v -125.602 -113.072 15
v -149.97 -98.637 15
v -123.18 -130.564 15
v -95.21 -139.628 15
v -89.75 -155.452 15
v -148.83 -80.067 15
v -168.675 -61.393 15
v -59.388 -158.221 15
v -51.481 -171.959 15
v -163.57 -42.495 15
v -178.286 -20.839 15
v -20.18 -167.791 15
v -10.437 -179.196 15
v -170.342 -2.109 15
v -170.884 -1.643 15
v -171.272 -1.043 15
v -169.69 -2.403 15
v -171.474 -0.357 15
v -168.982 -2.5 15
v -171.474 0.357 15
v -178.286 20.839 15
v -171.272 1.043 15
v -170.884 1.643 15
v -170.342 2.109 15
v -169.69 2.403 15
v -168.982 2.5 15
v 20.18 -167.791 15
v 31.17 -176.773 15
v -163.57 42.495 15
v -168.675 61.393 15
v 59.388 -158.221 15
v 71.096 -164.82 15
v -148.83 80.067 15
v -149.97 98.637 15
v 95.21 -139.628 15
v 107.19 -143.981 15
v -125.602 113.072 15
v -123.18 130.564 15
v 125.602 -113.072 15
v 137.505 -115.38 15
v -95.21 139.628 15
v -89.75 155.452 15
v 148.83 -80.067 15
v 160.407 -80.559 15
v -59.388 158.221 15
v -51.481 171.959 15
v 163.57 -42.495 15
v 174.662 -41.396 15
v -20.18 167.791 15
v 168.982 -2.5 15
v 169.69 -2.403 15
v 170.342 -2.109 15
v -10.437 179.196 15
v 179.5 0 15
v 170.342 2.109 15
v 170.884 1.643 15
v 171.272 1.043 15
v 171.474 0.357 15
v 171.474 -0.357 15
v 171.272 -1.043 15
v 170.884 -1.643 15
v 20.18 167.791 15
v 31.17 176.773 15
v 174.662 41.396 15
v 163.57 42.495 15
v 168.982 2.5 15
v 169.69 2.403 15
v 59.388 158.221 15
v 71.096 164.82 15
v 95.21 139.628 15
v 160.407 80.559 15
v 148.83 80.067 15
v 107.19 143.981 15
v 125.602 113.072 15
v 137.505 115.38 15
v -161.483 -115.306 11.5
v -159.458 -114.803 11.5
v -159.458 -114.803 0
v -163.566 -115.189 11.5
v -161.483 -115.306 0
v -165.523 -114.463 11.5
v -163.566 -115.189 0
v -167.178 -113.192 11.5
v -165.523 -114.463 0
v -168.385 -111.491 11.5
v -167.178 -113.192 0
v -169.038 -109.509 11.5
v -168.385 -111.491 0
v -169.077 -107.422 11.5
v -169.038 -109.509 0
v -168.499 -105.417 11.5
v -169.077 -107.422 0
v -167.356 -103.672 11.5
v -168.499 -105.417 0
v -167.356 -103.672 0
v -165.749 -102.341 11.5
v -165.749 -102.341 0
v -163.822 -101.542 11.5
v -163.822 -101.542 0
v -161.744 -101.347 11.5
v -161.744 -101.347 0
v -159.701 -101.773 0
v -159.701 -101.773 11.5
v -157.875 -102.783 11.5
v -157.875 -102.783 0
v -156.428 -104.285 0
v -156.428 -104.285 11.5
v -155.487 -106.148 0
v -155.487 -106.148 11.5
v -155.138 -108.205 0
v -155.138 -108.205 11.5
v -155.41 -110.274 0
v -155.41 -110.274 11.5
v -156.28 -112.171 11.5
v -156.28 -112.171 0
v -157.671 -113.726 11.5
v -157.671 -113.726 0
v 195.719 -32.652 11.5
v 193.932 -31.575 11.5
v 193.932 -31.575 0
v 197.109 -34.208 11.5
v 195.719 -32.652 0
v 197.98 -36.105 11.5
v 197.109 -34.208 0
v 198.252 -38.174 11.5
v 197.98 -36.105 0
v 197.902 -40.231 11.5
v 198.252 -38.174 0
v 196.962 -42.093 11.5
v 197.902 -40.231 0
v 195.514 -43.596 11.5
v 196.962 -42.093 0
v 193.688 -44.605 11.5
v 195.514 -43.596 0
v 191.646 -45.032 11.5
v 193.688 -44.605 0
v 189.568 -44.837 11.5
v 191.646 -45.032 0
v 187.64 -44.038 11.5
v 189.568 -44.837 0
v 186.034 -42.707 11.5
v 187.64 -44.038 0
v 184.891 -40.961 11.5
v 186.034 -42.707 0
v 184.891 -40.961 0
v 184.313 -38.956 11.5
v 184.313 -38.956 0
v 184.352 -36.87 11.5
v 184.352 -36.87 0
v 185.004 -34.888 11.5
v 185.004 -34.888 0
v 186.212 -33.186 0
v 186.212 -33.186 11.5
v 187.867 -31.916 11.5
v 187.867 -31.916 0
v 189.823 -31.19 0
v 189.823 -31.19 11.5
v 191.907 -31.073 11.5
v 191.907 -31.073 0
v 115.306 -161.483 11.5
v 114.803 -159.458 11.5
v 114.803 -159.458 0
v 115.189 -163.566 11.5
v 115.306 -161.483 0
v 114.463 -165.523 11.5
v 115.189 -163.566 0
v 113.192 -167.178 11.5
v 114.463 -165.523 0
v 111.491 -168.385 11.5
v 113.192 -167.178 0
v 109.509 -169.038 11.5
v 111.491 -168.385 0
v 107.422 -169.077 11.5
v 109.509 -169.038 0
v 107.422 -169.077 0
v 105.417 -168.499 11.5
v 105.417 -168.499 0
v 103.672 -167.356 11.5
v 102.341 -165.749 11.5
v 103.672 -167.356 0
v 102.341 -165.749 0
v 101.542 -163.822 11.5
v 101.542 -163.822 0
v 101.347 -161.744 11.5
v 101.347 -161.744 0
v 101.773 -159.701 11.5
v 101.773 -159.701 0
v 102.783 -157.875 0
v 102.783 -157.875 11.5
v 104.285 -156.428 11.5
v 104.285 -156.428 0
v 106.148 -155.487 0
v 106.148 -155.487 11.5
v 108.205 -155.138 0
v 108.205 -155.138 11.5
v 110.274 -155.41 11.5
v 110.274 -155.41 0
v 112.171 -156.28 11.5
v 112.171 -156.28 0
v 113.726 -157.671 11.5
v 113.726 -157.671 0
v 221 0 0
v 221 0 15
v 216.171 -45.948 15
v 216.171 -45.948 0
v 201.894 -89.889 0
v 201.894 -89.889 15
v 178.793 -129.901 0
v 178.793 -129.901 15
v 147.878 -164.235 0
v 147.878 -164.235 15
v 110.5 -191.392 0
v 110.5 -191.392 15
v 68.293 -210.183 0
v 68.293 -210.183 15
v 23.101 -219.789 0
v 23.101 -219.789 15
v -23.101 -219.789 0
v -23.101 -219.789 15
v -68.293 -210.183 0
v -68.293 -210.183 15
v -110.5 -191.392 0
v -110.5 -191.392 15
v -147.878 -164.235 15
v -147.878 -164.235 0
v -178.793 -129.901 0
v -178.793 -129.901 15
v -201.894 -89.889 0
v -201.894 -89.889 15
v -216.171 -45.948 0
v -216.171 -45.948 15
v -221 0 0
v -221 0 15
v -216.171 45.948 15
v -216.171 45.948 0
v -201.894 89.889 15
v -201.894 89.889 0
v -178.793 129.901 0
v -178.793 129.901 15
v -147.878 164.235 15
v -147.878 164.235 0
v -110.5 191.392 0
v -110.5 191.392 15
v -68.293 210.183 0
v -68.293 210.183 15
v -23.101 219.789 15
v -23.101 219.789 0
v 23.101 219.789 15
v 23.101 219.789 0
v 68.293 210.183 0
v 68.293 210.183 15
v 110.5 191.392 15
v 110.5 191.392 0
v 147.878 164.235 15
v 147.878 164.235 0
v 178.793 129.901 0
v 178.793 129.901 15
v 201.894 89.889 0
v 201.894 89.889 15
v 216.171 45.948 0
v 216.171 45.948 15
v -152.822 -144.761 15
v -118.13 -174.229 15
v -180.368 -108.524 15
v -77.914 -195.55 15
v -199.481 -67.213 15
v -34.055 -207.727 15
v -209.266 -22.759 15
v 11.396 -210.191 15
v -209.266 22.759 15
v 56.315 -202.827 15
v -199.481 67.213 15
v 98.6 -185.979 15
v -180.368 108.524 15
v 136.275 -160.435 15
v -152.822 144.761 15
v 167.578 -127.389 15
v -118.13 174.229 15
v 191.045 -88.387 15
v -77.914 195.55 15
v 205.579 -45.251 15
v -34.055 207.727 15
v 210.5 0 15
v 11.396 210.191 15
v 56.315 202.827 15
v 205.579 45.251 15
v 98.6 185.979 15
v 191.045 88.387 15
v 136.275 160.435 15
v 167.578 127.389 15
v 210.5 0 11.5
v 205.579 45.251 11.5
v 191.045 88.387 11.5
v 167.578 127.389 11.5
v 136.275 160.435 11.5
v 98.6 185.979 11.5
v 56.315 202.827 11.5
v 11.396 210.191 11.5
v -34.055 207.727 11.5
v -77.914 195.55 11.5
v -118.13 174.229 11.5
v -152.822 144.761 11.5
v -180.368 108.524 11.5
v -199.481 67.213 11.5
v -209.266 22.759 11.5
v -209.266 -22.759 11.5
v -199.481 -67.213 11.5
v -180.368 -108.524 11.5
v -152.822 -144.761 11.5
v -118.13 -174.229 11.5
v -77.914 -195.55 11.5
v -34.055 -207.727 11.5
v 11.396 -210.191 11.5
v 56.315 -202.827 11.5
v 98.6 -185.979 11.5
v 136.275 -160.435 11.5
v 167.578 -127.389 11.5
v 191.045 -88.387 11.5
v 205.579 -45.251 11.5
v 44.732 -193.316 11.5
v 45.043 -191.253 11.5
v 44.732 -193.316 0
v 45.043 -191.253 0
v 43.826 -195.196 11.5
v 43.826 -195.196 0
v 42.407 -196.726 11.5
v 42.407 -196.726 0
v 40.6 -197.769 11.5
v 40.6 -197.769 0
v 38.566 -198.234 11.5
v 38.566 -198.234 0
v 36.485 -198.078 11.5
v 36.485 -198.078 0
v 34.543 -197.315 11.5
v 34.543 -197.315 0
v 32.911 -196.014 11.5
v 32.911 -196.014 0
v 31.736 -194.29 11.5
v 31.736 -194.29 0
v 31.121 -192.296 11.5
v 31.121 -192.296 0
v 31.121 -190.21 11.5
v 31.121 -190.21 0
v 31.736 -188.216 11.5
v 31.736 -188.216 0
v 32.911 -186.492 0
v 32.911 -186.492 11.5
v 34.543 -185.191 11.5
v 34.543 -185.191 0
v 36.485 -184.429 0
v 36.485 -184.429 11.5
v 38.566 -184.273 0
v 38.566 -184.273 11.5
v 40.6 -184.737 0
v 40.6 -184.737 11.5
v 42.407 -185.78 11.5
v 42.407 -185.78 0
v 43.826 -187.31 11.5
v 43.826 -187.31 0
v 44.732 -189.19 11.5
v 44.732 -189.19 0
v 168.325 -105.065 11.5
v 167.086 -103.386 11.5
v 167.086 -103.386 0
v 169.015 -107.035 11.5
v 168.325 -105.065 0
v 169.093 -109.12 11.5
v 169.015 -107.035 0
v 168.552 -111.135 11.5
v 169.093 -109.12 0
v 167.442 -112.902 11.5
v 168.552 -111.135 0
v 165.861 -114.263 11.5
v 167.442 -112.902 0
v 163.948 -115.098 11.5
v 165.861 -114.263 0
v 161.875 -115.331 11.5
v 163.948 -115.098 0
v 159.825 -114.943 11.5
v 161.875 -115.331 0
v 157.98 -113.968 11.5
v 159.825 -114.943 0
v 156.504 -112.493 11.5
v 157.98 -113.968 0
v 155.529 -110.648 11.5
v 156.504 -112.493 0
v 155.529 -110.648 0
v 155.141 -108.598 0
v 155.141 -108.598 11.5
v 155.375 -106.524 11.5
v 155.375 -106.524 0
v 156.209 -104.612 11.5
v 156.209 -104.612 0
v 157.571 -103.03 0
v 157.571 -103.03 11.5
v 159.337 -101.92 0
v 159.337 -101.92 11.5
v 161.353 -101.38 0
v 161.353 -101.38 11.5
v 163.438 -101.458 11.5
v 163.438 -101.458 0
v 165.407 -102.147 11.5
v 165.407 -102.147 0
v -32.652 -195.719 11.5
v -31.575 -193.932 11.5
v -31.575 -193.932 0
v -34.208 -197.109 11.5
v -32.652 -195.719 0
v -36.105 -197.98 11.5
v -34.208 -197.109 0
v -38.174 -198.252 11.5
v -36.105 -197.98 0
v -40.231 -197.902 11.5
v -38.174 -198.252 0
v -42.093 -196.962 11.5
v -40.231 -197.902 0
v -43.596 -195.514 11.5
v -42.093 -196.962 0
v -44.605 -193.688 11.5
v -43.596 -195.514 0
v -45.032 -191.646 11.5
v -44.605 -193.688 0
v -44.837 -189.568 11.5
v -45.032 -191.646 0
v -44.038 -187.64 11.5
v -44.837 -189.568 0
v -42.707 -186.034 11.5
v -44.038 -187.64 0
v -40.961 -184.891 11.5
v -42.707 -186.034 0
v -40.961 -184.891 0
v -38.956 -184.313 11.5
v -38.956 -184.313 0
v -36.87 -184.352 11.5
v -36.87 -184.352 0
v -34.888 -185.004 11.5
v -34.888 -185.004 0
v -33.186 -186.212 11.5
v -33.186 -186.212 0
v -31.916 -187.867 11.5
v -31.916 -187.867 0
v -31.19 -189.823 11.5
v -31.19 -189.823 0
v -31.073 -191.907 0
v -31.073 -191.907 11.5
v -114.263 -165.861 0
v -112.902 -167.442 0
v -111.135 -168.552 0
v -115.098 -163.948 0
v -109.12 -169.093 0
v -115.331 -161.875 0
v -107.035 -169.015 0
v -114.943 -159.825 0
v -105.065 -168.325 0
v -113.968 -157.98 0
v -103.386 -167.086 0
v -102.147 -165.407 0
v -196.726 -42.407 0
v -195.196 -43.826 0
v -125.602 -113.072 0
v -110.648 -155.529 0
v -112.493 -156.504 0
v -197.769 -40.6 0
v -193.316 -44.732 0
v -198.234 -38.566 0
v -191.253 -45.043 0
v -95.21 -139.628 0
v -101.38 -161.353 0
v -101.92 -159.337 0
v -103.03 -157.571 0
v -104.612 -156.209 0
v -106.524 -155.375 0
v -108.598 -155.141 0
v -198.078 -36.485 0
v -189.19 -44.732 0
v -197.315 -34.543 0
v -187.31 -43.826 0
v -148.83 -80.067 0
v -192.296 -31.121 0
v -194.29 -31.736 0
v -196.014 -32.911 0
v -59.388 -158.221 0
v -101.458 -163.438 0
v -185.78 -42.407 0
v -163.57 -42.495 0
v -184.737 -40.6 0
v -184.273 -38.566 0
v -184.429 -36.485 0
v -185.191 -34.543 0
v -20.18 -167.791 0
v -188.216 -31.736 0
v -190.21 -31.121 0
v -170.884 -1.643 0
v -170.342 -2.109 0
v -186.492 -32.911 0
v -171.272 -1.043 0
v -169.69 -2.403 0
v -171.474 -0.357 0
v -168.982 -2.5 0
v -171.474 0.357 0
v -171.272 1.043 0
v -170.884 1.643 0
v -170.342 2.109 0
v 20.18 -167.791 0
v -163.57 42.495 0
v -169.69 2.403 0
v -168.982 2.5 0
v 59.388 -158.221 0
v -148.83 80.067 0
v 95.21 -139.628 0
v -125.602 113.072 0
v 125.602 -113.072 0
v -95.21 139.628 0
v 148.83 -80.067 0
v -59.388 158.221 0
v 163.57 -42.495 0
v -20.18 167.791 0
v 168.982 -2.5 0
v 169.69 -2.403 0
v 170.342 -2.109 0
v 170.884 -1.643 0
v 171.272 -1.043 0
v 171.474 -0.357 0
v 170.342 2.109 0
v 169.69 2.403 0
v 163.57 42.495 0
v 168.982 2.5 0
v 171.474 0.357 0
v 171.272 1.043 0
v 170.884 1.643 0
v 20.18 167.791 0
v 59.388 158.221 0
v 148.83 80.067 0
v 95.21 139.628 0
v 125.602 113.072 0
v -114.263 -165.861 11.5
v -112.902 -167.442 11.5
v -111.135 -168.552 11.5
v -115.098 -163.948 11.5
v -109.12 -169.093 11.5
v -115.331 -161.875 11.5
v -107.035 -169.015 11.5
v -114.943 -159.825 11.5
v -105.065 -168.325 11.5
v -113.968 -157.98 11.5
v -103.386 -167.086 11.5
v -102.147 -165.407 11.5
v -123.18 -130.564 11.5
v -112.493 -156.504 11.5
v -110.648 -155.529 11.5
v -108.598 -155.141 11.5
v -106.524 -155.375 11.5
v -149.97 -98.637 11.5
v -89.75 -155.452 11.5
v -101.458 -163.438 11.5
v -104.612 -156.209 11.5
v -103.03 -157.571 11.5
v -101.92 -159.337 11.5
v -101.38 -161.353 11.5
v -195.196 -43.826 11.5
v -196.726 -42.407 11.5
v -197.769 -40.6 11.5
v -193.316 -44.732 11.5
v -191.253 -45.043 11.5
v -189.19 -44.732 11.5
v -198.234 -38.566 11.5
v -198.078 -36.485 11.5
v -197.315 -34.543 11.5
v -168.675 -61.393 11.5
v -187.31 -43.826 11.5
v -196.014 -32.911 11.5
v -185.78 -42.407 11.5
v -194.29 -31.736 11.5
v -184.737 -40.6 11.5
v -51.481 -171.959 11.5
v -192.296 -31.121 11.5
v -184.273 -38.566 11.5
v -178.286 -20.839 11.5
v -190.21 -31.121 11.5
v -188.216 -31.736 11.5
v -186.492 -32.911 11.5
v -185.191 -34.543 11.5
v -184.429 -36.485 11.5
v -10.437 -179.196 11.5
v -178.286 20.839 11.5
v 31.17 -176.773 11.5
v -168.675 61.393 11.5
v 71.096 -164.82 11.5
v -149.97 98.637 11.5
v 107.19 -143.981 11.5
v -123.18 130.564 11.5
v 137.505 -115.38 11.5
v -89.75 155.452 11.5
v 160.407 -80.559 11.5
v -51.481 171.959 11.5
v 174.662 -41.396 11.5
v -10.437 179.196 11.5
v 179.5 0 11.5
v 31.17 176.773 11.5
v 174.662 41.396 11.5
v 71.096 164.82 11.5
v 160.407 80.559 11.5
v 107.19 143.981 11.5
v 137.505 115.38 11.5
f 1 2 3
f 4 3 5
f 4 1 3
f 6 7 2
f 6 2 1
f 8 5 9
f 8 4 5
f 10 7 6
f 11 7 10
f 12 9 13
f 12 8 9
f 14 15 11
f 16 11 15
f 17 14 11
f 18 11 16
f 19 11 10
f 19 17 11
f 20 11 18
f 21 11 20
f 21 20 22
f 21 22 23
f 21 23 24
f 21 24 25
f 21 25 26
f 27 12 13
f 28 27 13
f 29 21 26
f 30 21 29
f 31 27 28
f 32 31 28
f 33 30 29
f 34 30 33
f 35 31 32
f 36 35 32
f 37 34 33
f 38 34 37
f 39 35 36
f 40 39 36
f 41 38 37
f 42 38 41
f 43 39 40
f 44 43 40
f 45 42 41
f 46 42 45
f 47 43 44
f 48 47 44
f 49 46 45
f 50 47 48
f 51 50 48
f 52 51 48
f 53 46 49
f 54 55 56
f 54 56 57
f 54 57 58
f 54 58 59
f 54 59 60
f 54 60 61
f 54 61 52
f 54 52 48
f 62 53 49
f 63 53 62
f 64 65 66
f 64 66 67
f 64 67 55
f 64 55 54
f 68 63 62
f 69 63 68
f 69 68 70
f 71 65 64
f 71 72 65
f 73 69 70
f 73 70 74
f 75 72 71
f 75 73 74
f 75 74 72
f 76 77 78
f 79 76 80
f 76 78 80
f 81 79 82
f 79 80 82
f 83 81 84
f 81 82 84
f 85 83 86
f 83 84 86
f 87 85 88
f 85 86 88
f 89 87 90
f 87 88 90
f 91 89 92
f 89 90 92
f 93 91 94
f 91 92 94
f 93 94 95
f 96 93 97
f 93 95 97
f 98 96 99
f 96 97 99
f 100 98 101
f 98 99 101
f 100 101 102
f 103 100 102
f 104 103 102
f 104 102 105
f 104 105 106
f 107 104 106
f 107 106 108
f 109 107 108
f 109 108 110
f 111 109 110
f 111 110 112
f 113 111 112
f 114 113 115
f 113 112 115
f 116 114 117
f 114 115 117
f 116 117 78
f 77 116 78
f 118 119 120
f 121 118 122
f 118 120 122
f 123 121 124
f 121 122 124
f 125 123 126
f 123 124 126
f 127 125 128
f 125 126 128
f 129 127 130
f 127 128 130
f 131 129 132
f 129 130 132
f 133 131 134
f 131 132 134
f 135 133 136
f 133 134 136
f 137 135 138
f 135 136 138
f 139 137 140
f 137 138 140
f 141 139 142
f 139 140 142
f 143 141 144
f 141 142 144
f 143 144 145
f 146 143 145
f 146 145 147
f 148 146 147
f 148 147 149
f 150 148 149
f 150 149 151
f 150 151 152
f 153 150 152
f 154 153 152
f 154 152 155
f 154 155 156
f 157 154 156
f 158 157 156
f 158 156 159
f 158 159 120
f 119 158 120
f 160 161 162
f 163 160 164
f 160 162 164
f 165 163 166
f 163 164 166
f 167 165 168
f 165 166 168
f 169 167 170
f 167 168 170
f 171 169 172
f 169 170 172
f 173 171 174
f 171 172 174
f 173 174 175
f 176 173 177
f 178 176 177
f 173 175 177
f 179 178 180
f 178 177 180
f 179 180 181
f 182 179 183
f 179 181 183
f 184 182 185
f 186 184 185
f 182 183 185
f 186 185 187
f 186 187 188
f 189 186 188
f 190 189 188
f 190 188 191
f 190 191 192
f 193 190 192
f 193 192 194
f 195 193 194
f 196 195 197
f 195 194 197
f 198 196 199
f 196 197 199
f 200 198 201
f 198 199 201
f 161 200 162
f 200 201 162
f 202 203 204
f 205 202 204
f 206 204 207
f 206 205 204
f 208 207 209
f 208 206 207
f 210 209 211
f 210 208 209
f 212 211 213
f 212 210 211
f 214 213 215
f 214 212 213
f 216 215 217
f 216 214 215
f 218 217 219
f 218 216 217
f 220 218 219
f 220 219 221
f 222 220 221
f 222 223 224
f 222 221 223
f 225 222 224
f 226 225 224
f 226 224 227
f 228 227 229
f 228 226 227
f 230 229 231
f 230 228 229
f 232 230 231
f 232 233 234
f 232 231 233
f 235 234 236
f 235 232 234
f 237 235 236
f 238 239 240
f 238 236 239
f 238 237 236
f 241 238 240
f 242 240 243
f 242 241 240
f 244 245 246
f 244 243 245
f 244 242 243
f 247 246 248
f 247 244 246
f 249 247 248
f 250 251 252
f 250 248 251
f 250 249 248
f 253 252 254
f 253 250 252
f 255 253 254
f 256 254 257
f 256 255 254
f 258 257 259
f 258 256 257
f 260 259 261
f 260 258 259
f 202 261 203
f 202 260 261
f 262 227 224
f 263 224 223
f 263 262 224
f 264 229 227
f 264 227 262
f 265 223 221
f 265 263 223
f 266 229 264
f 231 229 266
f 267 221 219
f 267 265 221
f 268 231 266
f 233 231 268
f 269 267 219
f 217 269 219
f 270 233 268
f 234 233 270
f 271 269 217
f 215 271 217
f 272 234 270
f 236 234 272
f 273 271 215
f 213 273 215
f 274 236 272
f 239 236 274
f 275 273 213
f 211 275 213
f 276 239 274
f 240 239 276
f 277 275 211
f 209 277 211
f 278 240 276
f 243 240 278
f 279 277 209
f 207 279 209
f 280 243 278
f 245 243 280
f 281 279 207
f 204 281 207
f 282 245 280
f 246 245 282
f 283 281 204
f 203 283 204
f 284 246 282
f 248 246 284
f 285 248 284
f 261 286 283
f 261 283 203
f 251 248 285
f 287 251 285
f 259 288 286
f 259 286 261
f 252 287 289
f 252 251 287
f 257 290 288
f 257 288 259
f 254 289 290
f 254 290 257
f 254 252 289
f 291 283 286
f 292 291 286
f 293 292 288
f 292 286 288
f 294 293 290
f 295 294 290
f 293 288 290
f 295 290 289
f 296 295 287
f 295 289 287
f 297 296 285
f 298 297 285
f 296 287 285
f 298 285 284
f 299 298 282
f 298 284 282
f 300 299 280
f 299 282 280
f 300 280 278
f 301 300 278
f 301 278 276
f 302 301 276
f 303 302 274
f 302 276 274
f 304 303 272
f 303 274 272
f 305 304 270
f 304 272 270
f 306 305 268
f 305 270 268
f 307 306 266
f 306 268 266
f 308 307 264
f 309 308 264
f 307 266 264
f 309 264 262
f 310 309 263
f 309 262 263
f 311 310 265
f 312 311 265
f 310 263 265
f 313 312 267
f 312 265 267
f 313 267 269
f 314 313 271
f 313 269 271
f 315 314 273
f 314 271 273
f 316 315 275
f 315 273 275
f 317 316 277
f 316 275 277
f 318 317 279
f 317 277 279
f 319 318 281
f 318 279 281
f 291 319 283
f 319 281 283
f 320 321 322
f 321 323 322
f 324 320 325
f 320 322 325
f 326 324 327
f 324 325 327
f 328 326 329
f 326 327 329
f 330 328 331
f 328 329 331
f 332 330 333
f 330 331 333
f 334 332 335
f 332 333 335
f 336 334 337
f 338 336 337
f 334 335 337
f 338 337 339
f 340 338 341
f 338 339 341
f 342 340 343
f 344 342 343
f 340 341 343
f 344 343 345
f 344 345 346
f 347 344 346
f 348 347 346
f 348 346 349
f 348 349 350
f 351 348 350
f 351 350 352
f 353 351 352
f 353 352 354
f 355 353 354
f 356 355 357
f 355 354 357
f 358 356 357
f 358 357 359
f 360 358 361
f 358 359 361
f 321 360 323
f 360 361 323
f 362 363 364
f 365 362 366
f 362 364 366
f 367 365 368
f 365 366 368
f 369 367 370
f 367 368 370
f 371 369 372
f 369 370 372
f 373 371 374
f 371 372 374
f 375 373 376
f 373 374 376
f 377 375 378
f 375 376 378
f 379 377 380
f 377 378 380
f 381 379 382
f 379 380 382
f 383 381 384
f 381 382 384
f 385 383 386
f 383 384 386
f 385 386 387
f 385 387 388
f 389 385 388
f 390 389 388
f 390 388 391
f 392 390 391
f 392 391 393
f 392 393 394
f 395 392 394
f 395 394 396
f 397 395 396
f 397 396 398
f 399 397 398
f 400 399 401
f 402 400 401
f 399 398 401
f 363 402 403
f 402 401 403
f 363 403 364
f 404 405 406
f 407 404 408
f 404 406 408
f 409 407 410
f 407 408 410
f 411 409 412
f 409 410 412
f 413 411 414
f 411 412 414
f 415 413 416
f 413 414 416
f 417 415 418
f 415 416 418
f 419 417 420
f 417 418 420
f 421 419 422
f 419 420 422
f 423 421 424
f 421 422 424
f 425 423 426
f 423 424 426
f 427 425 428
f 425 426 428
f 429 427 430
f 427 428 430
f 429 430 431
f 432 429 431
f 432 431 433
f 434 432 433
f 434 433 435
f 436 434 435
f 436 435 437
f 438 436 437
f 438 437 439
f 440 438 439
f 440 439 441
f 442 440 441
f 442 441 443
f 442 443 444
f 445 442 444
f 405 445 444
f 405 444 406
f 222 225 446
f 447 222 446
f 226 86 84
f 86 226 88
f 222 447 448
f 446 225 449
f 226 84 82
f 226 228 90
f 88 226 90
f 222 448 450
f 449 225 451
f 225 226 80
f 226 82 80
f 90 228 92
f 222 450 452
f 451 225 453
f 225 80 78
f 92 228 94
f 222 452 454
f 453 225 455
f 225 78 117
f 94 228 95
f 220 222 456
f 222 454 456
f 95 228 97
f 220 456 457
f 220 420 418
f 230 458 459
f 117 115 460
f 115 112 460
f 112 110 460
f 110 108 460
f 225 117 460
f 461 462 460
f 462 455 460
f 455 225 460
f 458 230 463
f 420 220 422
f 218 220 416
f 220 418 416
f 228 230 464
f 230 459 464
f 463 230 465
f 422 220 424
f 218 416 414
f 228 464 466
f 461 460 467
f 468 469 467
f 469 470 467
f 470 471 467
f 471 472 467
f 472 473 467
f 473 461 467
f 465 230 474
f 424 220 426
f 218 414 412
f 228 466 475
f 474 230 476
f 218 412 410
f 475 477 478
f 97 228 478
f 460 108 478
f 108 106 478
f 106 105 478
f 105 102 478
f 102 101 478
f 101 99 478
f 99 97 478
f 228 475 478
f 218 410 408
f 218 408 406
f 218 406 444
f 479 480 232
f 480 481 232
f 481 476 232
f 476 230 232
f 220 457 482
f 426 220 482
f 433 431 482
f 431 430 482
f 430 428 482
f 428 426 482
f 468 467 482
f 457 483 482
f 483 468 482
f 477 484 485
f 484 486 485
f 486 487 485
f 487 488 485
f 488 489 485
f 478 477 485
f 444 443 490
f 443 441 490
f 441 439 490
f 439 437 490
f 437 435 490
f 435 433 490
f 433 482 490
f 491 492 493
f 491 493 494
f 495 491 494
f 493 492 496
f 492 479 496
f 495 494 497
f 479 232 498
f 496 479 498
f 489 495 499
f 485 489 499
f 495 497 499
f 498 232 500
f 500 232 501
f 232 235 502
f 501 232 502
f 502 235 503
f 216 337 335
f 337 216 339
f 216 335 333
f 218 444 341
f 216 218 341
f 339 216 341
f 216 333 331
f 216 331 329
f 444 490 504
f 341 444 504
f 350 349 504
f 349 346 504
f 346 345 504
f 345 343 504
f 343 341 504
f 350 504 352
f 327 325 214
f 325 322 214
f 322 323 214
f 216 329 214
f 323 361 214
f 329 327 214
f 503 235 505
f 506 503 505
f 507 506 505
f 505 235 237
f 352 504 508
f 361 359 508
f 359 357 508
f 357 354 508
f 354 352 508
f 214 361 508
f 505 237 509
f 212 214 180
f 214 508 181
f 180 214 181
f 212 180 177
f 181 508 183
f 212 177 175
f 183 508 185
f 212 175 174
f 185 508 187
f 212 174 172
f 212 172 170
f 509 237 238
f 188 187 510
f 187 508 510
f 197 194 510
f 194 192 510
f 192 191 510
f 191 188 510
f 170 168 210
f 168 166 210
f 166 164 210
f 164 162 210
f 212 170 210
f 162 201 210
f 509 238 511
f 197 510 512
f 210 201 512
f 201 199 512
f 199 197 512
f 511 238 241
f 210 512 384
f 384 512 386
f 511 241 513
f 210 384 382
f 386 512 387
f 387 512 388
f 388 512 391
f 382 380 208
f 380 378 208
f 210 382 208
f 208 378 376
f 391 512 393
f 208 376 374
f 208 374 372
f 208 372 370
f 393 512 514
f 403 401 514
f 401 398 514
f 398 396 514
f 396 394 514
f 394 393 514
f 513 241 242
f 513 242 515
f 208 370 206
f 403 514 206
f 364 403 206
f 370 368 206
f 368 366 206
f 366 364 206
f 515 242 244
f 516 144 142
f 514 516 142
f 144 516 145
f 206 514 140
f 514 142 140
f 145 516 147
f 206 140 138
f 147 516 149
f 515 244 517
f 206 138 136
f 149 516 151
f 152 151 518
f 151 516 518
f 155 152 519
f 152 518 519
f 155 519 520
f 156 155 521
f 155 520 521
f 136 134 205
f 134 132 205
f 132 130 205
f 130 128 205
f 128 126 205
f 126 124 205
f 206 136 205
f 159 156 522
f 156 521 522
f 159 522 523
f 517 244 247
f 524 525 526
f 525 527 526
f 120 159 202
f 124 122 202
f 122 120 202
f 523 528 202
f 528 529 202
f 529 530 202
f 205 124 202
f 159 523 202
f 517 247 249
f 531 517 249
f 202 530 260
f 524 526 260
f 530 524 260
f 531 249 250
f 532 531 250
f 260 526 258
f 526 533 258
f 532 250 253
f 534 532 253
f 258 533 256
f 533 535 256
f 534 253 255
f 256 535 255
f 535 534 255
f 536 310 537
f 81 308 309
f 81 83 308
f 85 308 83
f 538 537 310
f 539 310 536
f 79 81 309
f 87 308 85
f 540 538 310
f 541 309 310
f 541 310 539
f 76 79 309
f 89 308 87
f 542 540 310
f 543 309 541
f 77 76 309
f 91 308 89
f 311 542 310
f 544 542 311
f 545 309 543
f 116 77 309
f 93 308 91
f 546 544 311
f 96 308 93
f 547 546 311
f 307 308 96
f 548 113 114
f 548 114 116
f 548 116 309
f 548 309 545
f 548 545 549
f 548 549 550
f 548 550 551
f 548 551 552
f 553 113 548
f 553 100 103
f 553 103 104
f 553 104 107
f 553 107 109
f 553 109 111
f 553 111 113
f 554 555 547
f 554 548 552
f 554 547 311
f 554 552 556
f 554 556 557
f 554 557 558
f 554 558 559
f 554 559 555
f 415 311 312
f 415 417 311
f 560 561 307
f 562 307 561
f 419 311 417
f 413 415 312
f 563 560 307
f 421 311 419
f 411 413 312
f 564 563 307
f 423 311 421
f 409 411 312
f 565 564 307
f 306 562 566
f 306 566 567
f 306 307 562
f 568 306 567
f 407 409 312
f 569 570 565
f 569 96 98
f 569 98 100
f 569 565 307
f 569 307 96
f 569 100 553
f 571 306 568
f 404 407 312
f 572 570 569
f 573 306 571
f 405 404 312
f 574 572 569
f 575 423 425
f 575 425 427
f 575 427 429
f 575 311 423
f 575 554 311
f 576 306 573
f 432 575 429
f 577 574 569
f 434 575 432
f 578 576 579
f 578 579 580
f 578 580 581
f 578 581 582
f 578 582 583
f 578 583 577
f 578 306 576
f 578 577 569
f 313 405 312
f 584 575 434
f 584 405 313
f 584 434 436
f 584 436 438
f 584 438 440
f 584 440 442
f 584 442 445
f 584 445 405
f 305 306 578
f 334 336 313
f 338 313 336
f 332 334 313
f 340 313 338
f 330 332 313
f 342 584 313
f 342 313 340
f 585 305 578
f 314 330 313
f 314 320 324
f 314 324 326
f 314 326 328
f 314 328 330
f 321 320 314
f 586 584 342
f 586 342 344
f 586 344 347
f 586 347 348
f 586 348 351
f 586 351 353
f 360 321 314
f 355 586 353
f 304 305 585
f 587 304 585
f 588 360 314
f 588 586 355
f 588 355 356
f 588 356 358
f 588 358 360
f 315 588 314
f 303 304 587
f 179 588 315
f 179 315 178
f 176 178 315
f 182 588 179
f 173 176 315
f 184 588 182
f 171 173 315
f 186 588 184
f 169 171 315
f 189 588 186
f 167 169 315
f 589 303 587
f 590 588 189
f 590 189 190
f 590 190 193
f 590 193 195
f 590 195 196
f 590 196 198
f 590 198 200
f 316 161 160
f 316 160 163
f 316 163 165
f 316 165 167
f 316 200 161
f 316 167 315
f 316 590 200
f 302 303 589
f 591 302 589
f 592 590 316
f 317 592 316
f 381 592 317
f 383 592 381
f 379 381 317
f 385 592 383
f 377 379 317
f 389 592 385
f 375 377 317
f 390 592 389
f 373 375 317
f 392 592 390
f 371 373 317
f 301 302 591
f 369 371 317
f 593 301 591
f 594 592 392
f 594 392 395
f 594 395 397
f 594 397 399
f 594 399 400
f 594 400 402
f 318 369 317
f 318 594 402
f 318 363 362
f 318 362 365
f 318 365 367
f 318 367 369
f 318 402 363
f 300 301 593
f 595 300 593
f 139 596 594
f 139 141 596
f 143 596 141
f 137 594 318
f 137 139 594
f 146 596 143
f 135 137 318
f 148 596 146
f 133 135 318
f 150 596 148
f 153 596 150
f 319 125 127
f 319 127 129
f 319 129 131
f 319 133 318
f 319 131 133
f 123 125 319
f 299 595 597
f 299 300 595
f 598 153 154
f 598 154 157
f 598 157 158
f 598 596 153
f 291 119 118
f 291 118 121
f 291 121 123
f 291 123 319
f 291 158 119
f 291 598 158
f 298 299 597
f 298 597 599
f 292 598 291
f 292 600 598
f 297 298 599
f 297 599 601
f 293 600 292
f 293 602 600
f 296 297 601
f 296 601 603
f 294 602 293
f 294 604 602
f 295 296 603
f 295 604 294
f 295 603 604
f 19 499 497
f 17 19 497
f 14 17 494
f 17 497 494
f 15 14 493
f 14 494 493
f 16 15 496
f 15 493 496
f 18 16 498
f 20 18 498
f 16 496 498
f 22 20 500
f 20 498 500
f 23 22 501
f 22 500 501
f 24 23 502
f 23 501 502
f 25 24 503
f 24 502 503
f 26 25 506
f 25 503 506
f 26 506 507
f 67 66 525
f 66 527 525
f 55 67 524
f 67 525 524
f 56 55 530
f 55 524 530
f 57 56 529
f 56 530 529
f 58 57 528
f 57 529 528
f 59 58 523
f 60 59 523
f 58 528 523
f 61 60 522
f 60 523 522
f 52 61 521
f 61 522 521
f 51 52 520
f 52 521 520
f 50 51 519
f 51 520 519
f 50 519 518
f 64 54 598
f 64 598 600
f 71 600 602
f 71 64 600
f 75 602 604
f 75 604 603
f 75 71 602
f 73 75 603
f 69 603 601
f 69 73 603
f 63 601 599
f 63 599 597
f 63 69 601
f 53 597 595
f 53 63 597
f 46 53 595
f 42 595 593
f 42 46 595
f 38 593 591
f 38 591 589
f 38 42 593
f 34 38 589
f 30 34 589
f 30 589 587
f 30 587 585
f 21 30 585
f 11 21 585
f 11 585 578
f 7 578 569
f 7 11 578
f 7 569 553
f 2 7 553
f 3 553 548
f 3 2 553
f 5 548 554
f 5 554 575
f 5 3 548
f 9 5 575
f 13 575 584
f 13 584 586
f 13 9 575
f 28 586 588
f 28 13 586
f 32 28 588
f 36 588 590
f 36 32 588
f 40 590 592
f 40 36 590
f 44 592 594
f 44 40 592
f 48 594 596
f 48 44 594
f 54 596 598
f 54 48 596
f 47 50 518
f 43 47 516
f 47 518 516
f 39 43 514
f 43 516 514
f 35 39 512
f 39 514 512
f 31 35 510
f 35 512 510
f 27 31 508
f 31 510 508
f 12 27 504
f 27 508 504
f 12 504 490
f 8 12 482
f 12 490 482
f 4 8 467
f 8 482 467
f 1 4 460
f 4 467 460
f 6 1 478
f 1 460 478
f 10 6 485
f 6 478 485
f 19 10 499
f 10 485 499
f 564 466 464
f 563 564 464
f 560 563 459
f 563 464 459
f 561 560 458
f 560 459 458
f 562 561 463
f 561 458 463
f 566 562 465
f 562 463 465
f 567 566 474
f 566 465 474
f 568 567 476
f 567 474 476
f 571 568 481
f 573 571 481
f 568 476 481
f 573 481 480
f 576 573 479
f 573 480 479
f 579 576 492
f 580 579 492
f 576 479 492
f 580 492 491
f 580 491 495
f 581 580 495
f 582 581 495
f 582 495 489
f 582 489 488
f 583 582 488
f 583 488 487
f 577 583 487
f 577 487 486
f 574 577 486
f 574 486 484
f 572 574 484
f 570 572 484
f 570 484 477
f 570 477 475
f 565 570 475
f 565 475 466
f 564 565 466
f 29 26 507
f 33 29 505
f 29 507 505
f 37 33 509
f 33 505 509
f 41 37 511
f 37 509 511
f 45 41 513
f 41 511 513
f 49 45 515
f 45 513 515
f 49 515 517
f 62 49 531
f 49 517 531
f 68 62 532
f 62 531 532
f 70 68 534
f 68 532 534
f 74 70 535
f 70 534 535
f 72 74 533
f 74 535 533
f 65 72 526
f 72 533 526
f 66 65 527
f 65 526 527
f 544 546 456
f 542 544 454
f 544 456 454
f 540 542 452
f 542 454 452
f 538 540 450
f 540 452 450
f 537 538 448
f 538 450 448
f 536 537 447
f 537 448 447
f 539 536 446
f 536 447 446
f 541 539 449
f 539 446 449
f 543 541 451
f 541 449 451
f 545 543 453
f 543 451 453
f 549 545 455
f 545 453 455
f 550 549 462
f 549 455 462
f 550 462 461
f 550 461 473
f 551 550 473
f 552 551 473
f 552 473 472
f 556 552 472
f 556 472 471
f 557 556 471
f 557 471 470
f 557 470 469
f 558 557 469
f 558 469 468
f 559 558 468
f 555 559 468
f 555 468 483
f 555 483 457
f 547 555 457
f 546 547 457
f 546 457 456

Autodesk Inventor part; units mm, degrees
ref_plane "YZ Plane" through (0, 0, 0) normal (1, 0, 0) x (0, 1, 0)
ref_plane "XZ Plane" through (0, 0, 0) normal (0, 1, 0) x (-1, 0, 0)
ref_plane "XY Plane" through (0, 0, 0) normal (0, 0, 1) x (1, 0, 0)
sketch "Sketch1" plane through (0, 0, 0) normal (0, 0, 1) x (1, 0, 0)
  circle A0 centre (0, 0) radius 169
  circle A1 centre (0, 0) radius 221
  circle A2 centre (0, 0) radius 195 construction
  line L0 (0, 169) -> (0, 221) construction
  point P0 (0, 195)
  dimension "d17" = 390
  dimension "d18" = 52
extrude "Extrusion1" add sketch "Sketch1" along normal blind 15
sketch "Sketch2" plane through (0, 0, 15) normal (0, 0, 1) x (1, 0, 0)
  circle A0 centre (0, 0) radius 221 construction
  circle A1 centre (0, 0) radius 169 construction
  line L0 (0, 210.5) -> (0, 179.5) construction
  line L1 (0, 169) -> (0, 0) construction
  circle A2 centre (0, 0) radius 179.5
  circle A3 centre (0, 0) radius 210.5
  circle A4 centre (0, 0) radius 195 construction
  point P0 (0, 195)
  dimension "d19" = 390
  dimension "d4" = 31
extrude "Extrusion2" cut sketch "Sketch2" against normal blind 3.5
sketch "Sketch3" plane through (0, 0, 0) normal (0, 0, 1) x (1, 0, 0)
  circle A0 centre (0, 0) radius 169 construction
  circle A1 centre (0, 0) radius 221 construction
  circle A2 centre (0, 0) radius 179.5 projected
  circle A3 centre (0, 0) radius 210.5 projected
  circle A4 centre (0, 0) radius 221 projected
  line L0 (0, 0) -> (0, -221) construction
  line L1 (0, 0) -> (43.115, -216.7535) construction
  line L2 (35.0187, -176.051) -> (41.0665, -206.4553) construction
  circle A5 centre (38.0426, -191.2531) radius 7
  dimension "d20" = 11.25
  dimension "d21" = 14
extrude "Extrusion3" cut sketch "Sketch3" along normal through all contours A5
pattern_circular "Circular Pattern2" count 8 over 157.5 about axis through (0, 0, 0) along (0, 0, -1) of "Extrusion3" both ways yes
sketch "Sketch5" plane through (0, 0, 0) normal (0, 0, -1) x (-1, 0, 0)
  circle A0 centre (0, 0) radius 169 projected
  circle A1 centre (0, 0) radius 221 projected
  line L0 (0, 0) -> (169, 0) construction
  arc A2 (168.9815, -2.4999) -> (168.9815, 2.4999) centre (169, 0) ccw
  dimension "d36" = 5
extrude "Extrusion4" cut sketch "Sketch5" against normal through all contours A0 A2
mirror "Mirror1" about plane through (0, 0, 0) normal (1, 0, 0) of "Extrusion4"
equation "\"d17\" = Шпил_пласт_НОС_диам_центров"
equation "\"d19\" = Шпил_пласт_НОС_диам_центров"
equation "\"BendReliefDepth\" = 0.5 * Thickness"
equation "\"Шпил_пласт_НОС_диам_центров\" = 390"
equation "\"Thickness\" = 10"
properties part number "ДМФ 021 кольцо прижимное нос v2.0"
